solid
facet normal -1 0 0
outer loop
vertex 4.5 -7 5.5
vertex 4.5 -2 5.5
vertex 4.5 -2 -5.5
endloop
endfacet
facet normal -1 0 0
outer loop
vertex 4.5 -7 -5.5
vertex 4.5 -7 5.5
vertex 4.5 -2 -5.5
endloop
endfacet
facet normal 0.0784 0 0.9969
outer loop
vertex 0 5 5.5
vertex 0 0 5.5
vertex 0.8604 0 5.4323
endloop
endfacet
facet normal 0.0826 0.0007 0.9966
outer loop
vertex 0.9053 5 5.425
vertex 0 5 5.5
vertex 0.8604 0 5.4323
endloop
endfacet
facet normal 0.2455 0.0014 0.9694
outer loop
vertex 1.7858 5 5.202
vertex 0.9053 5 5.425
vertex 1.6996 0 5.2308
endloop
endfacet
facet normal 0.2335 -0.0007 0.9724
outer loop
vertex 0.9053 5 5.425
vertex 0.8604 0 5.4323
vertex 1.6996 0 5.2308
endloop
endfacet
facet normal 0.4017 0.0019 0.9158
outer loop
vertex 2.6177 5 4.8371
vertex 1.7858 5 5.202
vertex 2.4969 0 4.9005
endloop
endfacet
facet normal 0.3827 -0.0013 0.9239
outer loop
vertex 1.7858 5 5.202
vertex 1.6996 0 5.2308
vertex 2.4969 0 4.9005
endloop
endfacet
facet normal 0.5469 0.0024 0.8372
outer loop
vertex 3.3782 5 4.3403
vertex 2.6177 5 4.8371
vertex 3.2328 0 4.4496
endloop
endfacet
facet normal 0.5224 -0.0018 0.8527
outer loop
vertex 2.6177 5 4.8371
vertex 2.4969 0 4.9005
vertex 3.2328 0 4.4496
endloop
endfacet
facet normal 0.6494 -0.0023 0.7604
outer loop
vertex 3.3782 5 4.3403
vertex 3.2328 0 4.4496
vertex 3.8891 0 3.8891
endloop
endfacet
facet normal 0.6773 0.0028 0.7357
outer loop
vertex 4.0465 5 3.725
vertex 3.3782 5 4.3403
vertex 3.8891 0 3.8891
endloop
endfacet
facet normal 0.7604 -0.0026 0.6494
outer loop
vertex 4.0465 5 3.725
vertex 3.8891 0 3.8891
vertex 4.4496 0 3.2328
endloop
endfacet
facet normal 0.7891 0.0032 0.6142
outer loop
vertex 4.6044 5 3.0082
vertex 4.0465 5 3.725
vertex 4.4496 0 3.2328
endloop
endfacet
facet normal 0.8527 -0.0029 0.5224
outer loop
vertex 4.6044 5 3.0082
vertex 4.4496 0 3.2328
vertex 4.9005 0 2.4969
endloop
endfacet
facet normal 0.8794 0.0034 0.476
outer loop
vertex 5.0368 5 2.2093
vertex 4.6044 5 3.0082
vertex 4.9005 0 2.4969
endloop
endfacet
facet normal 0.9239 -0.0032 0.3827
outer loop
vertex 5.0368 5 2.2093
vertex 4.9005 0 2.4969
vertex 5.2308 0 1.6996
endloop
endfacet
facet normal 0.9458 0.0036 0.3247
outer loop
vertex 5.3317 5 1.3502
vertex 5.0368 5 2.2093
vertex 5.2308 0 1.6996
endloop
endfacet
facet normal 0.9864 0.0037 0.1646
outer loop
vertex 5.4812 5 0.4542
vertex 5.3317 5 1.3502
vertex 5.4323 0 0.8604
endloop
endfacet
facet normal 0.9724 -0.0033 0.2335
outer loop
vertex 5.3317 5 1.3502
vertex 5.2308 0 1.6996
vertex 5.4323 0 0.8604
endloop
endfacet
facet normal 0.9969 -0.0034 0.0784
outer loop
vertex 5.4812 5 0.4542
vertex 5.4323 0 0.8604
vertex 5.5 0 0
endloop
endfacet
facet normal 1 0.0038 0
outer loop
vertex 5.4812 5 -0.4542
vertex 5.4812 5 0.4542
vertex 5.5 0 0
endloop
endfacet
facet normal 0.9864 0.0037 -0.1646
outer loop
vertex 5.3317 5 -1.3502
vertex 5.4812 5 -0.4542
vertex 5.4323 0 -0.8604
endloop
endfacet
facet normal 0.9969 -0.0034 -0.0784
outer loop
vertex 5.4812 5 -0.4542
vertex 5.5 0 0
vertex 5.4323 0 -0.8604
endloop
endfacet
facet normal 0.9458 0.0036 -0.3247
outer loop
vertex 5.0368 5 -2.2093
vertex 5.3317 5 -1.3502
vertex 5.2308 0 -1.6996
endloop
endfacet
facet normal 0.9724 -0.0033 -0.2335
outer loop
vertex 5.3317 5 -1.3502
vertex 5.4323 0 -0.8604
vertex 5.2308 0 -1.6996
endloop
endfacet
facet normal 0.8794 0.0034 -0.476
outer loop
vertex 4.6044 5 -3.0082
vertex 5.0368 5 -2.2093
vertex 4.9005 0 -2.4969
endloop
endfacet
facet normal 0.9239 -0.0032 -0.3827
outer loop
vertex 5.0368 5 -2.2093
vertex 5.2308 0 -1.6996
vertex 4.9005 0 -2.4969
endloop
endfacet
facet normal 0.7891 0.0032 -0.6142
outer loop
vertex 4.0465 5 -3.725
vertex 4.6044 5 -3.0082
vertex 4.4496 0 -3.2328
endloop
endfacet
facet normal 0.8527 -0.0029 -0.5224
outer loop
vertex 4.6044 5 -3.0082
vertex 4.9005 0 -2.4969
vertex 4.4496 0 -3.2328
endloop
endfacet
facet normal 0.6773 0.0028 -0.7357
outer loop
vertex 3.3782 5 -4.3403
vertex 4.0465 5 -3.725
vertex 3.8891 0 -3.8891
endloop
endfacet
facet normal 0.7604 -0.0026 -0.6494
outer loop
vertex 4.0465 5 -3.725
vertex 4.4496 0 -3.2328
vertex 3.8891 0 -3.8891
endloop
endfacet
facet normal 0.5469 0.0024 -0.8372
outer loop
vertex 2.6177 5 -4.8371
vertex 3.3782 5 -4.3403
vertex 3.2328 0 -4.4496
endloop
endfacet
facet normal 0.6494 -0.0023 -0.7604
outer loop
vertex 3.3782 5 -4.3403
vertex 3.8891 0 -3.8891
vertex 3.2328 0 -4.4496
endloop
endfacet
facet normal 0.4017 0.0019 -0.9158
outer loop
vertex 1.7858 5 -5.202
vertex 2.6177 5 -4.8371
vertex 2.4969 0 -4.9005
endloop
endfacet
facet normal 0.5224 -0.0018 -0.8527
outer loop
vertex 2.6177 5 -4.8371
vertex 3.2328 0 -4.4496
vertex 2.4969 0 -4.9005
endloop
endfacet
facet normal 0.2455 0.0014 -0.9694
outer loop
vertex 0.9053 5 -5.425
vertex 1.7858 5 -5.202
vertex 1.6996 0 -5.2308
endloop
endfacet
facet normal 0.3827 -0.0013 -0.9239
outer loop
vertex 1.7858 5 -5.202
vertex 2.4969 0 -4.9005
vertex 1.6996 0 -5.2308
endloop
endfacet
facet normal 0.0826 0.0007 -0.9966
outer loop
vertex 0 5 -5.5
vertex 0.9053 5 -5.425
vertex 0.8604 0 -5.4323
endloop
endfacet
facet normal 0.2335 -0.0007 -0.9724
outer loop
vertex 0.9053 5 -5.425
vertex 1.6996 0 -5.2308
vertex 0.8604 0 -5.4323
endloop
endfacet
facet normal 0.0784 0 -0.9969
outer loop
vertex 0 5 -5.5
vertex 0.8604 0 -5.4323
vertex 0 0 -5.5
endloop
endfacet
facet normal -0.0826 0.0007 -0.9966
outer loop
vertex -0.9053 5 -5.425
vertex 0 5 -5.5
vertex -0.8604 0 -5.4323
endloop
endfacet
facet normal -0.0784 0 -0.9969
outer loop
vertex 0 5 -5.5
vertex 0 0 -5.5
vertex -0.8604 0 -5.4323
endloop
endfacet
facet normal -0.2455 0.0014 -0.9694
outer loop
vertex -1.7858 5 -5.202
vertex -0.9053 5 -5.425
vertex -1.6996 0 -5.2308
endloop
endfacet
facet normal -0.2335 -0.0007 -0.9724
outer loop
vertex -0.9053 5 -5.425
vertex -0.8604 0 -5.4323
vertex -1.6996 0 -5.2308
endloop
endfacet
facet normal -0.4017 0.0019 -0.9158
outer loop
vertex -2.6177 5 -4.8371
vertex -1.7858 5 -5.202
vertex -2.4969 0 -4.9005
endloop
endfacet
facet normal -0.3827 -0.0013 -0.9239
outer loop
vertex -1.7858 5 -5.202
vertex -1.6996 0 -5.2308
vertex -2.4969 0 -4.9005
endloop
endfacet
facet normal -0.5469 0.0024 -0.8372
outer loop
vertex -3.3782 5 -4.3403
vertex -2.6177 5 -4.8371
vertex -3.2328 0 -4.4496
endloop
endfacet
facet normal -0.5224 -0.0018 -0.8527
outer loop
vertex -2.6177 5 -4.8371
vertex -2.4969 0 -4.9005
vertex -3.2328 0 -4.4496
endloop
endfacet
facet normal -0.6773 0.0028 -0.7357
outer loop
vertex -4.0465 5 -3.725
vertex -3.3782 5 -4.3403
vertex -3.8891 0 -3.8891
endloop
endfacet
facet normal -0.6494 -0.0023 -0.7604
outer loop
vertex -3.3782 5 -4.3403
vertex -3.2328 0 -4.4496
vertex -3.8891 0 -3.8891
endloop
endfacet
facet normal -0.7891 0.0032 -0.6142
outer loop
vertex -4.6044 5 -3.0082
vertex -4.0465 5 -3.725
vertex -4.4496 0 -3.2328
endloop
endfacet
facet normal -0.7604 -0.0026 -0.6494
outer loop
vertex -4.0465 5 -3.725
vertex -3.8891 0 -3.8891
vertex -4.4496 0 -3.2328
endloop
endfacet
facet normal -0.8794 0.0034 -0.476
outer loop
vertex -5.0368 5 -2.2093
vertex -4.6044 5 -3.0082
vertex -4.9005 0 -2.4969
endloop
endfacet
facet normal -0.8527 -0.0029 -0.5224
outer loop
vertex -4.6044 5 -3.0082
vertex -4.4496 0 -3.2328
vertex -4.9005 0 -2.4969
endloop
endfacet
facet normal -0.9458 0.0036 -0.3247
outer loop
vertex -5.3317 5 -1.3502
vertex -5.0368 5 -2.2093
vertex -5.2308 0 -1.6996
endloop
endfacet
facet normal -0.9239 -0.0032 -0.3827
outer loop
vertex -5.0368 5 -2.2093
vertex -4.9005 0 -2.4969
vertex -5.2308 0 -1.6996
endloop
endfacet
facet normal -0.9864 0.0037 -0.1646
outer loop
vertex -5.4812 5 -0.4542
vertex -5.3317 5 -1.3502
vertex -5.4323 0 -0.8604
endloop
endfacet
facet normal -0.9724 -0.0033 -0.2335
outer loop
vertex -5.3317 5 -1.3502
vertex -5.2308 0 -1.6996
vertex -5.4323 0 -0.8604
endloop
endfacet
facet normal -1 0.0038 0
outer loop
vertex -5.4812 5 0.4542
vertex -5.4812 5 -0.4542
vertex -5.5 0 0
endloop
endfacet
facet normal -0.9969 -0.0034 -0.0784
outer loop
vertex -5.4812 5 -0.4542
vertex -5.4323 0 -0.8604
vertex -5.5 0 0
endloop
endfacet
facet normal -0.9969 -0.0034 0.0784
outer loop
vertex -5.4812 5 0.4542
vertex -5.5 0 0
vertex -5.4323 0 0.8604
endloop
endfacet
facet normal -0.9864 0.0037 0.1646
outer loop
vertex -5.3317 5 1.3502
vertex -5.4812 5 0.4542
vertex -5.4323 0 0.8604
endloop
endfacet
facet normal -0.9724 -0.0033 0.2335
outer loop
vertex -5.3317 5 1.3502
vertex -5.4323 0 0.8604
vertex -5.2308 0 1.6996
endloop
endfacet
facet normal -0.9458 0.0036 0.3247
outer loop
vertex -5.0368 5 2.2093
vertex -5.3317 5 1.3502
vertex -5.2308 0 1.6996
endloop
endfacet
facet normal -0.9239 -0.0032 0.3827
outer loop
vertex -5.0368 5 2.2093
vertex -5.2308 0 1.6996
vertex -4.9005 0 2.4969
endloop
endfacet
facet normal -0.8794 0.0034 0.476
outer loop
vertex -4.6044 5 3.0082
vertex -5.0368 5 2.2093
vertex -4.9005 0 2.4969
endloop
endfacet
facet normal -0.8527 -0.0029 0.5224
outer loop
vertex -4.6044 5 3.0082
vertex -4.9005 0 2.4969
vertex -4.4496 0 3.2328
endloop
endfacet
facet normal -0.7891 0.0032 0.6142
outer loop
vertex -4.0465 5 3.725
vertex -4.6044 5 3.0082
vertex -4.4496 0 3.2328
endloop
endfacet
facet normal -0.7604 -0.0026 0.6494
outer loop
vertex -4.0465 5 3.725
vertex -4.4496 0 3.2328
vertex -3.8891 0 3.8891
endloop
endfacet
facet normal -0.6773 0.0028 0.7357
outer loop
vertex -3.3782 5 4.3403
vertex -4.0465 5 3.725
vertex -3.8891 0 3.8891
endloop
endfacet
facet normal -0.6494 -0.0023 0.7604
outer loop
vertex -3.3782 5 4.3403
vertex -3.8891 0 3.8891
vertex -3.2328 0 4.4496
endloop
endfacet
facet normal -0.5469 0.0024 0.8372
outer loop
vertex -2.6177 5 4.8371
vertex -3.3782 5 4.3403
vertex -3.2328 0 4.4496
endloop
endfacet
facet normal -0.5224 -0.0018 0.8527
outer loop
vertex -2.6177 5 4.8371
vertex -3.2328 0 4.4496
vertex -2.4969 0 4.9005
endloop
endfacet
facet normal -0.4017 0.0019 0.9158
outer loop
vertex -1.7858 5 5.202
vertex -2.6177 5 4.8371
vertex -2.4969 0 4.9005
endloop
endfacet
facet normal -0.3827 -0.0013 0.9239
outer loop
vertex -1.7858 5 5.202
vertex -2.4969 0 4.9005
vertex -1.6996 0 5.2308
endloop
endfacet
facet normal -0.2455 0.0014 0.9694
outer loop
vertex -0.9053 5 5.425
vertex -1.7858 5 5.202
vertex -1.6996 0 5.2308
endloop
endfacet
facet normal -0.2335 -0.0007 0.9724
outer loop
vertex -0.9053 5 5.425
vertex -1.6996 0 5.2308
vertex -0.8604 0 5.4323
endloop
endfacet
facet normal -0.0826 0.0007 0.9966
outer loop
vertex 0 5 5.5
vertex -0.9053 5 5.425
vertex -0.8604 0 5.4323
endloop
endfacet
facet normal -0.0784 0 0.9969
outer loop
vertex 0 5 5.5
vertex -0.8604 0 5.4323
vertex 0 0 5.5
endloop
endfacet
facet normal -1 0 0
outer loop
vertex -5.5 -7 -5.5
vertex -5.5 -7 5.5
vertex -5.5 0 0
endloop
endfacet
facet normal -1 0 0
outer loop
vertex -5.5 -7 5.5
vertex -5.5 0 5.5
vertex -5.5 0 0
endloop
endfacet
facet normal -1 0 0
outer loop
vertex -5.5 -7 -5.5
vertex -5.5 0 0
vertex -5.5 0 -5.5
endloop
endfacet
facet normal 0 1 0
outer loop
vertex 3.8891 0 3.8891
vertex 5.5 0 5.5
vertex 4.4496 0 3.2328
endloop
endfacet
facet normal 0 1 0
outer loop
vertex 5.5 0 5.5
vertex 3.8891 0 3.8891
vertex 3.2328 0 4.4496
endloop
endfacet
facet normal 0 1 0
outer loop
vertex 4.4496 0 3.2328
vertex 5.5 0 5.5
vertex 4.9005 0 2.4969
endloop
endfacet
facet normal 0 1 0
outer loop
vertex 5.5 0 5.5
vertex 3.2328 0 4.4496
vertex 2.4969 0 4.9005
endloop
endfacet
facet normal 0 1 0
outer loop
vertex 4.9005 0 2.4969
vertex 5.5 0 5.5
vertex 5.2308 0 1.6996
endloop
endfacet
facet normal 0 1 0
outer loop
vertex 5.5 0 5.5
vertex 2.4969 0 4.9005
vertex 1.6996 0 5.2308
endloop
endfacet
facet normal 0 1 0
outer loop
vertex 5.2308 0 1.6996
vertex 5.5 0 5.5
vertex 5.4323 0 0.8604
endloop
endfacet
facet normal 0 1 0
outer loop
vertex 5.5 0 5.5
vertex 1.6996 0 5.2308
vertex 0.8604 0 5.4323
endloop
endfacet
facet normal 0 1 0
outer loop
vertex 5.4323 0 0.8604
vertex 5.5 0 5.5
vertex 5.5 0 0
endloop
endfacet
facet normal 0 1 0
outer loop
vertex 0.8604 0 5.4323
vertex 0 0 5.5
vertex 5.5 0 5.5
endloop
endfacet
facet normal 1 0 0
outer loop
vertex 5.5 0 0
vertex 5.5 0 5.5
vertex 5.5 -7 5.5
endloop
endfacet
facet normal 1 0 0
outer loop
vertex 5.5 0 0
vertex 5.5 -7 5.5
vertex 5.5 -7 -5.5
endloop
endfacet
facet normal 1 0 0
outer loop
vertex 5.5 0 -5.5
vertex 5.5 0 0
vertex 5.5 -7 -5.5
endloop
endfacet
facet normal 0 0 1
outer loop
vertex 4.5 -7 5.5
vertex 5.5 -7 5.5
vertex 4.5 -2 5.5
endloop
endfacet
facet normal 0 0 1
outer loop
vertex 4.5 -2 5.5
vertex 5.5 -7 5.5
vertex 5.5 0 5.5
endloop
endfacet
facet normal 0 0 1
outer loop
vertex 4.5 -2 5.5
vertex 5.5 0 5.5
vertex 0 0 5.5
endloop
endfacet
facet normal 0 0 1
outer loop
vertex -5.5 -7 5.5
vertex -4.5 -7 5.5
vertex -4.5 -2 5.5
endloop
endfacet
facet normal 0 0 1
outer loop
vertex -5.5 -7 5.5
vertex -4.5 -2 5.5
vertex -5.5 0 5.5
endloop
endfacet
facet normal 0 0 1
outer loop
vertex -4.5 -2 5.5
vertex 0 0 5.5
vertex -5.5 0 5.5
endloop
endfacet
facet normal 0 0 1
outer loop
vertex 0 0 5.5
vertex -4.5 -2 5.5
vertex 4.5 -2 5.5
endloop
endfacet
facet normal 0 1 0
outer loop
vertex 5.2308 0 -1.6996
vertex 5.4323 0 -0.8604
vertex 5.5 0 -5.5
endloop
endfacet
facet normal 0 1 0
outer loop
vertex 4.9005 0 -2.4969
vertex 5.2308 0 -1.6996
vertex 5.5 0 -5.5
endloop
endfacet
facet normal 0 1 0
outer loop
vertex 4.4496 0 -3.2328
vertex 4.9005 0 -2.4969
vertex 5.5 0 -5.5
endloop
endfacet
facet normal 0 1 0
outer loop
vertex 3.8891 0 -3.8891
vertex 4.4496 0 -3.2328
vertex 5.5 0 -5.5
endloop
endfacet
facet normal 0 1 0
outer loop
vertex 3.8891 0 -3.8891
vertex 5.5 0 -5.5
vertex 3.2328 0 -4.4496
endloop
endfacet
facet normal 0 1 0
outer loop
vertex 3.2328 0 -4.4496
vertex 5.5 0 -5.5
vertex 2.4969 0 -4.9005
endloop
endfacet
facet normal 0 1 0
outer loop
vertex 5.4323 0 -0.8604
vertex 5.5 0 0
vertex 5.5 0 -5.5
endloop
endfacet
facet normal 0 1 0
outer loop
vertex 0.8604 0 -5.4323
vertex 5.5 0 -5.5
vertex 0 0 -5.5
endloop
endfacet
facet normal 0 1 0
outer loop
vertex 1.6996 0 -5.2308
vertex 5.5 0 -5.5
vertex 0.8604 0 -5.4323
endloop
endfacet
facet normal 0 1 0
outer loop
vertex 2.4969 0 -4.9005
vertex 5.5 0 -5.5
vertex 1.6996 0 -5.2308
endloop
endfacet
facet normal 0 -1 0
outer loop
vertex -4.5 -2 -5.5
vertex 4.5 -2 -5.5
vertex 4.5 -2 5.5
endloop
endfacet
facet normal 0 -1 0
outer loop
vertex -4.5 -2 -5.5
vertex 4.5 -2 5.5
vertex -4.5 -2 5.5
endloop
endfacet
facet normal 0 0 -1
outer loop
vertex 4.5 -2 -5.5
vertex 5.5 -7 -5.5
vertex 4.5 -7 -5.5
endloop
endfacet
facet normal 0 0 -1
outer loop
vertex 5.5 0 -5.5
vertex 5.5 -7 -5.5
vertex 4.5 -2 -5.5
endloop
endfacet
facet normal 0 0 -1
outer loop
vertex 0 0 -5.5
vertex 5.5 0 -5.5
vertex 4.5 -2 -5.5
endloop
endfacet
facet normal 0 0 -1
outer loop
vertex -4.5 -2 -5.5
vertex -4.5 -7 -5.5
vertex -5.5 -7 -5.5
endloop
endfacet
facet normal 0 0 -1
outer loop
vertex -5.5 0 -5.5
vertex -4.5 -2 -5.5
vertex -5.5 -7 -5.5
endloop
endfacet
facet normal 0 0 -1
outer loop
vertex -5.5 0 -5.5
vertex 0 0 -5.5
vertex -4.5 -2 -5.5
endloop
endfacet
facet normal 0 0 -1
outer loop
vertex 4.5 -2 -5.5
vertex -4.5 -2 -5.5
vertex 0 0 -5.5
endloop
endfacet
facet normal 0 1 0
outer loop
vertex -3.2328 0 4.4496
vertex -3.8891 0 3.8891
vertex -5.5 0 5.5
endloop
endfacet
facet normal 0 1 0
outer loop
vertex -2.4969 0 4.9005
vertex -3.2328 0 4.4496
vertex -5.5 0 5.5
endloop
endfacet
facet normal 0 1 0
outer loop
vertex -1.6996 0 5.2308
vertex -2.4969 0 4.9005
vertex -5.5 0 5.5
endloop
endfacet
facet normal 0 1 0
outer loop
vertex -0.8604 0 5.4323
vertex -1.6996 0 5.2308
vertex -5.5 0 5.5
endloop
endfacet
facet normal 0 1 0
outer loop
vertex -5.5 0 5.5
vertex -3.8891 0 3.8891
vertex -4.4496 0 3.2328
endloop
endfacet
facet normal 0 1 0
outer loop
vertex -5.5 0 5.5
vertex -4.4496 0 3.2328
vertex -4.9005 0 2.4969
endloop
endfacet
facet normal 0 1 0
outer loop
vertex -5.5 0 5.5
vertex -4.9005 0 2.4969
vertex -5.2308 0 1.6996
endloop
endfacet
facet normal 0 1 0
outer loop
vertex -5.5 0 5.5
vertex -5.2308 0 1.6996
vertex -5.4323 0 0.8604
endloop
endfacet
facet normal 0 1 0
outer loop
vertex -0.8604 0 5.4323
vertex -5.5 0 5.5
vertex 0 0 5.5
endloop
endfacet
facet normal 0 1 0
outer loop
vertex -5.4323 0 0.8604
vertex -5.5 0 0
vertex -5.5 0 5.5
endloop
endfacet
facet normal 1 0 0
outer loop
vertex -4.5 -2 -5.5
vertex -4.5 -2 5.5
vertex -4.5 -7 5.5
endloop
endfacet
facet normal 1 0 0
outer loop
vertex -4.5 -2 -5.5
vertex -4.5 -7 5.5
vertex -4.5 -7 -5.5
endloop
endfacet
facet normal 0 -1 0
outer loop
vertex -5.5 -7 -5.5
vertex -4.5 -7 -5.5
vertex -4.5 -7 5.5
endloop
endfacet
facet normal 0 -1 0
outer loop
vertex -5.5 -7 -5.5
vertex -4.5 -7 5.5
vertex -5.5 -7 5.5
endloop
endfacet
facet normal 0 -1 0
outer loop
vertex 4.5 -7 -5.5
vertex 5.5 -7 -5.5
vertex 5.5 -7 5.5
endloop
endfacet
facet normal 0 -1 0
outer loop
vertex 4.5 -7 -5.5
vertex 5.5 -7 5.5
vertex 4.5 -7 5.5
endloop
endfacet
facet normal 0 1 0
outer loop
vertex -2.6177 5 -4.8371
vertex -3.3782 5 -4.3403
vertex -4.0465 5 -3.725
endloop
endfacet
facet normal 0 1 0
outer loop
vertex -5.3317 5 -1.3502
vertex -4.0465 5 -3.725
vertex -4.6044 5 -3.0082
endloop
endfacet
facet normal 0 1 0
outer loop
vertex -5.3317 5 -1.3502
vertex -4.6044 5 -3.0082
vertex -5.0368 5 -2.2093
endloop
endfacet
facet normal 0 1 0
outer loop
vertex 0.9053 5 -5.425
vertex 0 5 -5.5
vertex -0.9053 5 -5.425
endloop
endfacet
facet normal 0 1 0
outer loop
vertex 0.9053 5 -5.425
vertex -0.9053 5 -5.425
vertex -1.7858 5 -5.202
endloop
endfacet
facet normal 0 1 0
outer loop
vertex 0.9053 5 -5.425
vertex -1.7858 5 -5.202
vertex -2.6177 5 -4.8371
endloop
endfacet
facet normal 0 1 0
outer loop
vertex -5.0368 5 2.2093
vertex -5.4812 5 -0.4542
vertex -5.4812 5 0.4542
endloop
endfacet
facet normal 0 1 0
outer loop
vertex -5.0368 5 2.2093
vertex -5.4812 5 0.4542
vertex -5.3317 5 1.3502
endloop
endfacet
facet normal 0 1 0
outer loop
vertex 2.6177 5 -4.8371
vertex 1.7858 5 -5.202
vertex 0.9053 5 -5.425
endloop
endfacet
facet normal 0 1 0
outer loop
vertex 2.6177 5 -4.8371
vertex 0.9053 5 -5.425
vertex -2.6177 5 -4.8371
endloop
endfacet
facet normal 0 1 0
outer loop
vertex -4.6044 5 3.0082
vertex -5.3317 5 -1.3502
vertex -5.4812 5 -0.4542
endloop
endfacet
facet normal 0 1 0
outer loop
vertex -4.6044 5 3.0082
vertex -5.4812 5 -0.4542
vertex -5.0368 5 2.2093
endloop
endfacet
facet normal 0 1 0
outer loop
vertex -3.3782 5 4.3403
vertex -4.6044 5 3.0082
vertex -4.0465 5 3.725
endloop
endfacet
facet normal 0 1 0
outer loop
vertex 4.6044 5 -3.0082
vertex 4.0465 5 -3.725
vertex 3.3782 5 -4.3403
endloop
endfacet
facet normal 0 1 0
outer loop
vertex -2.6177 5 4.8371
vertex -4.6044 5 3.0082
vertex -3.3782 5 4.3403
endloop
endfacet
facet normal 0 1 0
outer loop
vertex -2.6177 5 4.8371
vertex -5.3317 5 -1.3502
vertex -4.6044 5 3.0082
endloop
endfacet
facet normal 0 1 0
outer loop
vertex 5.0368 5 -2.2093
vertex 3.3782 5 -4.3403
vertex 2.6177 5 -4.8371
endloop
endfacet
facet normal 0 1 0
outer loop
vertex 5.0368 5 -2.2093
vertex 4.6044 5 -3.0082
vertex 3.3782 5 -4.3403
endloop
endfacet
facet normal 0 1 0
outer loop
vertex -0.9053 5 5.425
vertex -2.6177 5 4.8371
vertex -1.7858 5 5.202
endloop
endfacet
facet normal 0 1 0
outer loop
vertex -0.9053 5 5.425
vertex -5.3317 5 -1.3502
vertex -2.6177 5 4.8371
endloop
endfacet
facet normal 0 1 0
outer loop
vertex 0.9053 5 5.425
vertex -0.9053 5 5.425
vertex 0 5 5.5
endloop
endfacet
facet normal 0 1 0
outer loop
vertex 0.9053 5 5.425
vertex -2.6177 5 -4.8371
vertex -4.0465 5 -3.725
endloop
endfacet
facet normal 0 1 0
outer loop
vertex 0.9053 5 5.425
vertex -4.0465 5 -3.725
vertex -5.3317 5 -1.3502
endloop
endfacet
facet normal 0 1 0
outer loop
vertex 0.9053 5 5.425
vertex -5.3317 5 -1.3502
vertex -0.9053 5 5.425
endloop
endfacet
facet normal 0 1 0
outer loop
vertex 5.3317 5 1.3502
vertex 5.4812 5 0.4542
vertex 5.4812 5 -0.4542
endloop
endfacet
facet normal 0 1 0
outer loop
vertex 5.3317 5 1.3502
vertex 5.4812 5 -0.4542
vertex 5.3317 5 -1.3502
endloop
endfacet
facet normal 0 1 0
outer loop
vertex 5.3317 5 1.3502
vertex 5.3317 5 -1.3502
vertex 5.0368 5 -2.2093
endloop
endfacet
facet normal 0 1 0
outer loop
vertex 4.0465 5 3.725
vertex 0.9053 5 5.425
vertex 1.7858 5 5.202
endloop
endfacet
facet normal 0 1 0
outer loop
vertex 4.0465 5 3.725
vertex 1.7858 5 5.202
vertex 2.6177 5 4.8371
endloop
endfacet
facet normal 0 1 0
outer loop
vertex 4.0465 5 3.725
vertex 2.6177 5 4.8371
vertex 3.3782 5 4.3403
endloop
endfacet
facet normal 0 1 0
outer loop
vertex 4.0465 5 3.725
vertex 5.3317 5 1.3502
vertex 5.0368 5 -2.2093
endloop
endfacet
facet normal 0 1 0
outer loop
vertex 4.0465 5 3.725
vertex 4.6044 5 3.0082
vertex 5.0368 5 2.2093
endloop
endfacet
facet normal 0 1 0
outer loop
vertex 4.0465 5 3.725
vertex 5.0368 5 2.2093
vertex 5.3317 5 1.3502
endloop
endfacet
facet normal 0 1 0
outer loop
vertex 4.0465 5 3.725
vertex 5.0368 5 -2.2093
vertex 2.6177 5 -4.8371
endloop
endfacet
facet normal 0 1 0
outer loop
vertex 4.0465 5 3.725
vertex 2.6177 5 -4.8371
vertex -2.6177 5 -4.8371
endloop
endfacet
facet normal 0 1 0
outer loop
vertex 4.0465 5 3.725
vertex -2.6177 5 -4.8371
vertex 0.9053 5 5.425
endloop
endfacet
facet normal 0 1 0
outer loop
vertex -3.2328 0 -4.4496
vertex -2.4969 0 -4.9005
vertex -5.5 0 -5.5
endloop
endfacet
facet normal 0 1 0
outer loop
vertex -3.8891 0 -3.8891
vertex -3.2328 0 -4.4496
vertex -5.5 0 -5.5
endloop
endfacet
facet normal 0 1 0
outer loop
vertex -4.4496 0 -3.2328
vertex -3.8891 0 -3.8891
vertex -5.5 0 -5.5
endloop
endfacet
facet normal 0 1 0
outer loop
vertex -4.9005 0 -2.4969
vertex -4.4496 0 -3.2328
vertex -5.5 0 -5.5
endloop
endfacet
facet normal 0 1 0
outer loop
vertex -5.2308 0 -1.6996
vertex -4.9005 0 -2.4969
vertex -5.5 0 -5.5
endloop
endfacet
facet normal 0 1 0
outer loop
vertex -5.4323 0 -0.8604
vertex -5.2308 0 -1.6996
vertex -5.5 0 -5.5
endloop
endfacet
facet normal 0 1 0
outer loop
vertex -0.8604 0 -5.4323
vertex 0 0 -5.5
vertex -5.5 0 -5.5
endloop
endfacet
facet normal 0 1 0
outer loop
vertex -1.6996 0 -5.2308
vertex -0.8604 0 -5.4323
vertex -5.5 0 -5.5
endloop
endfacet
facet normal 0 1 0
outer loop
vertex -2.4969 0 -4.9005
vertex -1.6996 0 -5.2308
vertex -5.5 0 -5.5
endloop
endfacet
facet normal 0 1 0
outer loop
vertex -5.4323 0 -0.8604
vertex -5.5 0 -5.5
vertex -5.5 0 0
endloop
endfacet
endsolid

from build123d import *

# Parameters (mm, degrees)
SKETCH1_R           = 5.5
BOSS_EXTRUDE1_DEPTH = 5
SKETCH2_W           = 11
SKETCH2_H           = 11
BOSS_EXTRUDE2_DEPTH = 2
SKETCH3_W           = 1
SKETCH3_H           = 11
BOSS_EXTRUDE3_DEPTH = 5


with BuildPart() as part:
    # Sketch1 → Boss-Extrude1 (new body)
    with BuildSketch(Plane(origin=(0, 0, 0), x_dir=(1, 0, 0), z_dir=(0, 1, 0))):
        with Locations(Location((0, 0, 0), (0, 0, 270))):
            Circle(SKETCH1_R)
    extrude(amount=BOSS_EXTRUDE1_DEPTH)

    # Sketch2 → Boss-Extrude2 (add)
    with BuildSketch(Plane(origin=(0, 0, 0), x_dir=(-1, 0, 0), z_dir=(0, -1, 0))):
        Rectangle(SKETCH2_W, SKETCH2_H)
    extrude(amount=BOSS_EXTRUDE2_DEPTH)

    # Sketch3 → Boss-Extrude3 (add)
    with BuildSketch(Plane(origin=(0, -2, 0), x_dir=(-1, 0, 0), z_dir=(0, -1, 0))):
        with Locations((5, 0)):
            Rectangle(SKETCH3_W, SKETCH3_H)
        with Locations((-5, 0)):
            Rectangle(SKETCH3_W, SKETCH3_H)
    extrude(amount=BOSS_EXTRUDE3_DEPTH)


solid = part.part
